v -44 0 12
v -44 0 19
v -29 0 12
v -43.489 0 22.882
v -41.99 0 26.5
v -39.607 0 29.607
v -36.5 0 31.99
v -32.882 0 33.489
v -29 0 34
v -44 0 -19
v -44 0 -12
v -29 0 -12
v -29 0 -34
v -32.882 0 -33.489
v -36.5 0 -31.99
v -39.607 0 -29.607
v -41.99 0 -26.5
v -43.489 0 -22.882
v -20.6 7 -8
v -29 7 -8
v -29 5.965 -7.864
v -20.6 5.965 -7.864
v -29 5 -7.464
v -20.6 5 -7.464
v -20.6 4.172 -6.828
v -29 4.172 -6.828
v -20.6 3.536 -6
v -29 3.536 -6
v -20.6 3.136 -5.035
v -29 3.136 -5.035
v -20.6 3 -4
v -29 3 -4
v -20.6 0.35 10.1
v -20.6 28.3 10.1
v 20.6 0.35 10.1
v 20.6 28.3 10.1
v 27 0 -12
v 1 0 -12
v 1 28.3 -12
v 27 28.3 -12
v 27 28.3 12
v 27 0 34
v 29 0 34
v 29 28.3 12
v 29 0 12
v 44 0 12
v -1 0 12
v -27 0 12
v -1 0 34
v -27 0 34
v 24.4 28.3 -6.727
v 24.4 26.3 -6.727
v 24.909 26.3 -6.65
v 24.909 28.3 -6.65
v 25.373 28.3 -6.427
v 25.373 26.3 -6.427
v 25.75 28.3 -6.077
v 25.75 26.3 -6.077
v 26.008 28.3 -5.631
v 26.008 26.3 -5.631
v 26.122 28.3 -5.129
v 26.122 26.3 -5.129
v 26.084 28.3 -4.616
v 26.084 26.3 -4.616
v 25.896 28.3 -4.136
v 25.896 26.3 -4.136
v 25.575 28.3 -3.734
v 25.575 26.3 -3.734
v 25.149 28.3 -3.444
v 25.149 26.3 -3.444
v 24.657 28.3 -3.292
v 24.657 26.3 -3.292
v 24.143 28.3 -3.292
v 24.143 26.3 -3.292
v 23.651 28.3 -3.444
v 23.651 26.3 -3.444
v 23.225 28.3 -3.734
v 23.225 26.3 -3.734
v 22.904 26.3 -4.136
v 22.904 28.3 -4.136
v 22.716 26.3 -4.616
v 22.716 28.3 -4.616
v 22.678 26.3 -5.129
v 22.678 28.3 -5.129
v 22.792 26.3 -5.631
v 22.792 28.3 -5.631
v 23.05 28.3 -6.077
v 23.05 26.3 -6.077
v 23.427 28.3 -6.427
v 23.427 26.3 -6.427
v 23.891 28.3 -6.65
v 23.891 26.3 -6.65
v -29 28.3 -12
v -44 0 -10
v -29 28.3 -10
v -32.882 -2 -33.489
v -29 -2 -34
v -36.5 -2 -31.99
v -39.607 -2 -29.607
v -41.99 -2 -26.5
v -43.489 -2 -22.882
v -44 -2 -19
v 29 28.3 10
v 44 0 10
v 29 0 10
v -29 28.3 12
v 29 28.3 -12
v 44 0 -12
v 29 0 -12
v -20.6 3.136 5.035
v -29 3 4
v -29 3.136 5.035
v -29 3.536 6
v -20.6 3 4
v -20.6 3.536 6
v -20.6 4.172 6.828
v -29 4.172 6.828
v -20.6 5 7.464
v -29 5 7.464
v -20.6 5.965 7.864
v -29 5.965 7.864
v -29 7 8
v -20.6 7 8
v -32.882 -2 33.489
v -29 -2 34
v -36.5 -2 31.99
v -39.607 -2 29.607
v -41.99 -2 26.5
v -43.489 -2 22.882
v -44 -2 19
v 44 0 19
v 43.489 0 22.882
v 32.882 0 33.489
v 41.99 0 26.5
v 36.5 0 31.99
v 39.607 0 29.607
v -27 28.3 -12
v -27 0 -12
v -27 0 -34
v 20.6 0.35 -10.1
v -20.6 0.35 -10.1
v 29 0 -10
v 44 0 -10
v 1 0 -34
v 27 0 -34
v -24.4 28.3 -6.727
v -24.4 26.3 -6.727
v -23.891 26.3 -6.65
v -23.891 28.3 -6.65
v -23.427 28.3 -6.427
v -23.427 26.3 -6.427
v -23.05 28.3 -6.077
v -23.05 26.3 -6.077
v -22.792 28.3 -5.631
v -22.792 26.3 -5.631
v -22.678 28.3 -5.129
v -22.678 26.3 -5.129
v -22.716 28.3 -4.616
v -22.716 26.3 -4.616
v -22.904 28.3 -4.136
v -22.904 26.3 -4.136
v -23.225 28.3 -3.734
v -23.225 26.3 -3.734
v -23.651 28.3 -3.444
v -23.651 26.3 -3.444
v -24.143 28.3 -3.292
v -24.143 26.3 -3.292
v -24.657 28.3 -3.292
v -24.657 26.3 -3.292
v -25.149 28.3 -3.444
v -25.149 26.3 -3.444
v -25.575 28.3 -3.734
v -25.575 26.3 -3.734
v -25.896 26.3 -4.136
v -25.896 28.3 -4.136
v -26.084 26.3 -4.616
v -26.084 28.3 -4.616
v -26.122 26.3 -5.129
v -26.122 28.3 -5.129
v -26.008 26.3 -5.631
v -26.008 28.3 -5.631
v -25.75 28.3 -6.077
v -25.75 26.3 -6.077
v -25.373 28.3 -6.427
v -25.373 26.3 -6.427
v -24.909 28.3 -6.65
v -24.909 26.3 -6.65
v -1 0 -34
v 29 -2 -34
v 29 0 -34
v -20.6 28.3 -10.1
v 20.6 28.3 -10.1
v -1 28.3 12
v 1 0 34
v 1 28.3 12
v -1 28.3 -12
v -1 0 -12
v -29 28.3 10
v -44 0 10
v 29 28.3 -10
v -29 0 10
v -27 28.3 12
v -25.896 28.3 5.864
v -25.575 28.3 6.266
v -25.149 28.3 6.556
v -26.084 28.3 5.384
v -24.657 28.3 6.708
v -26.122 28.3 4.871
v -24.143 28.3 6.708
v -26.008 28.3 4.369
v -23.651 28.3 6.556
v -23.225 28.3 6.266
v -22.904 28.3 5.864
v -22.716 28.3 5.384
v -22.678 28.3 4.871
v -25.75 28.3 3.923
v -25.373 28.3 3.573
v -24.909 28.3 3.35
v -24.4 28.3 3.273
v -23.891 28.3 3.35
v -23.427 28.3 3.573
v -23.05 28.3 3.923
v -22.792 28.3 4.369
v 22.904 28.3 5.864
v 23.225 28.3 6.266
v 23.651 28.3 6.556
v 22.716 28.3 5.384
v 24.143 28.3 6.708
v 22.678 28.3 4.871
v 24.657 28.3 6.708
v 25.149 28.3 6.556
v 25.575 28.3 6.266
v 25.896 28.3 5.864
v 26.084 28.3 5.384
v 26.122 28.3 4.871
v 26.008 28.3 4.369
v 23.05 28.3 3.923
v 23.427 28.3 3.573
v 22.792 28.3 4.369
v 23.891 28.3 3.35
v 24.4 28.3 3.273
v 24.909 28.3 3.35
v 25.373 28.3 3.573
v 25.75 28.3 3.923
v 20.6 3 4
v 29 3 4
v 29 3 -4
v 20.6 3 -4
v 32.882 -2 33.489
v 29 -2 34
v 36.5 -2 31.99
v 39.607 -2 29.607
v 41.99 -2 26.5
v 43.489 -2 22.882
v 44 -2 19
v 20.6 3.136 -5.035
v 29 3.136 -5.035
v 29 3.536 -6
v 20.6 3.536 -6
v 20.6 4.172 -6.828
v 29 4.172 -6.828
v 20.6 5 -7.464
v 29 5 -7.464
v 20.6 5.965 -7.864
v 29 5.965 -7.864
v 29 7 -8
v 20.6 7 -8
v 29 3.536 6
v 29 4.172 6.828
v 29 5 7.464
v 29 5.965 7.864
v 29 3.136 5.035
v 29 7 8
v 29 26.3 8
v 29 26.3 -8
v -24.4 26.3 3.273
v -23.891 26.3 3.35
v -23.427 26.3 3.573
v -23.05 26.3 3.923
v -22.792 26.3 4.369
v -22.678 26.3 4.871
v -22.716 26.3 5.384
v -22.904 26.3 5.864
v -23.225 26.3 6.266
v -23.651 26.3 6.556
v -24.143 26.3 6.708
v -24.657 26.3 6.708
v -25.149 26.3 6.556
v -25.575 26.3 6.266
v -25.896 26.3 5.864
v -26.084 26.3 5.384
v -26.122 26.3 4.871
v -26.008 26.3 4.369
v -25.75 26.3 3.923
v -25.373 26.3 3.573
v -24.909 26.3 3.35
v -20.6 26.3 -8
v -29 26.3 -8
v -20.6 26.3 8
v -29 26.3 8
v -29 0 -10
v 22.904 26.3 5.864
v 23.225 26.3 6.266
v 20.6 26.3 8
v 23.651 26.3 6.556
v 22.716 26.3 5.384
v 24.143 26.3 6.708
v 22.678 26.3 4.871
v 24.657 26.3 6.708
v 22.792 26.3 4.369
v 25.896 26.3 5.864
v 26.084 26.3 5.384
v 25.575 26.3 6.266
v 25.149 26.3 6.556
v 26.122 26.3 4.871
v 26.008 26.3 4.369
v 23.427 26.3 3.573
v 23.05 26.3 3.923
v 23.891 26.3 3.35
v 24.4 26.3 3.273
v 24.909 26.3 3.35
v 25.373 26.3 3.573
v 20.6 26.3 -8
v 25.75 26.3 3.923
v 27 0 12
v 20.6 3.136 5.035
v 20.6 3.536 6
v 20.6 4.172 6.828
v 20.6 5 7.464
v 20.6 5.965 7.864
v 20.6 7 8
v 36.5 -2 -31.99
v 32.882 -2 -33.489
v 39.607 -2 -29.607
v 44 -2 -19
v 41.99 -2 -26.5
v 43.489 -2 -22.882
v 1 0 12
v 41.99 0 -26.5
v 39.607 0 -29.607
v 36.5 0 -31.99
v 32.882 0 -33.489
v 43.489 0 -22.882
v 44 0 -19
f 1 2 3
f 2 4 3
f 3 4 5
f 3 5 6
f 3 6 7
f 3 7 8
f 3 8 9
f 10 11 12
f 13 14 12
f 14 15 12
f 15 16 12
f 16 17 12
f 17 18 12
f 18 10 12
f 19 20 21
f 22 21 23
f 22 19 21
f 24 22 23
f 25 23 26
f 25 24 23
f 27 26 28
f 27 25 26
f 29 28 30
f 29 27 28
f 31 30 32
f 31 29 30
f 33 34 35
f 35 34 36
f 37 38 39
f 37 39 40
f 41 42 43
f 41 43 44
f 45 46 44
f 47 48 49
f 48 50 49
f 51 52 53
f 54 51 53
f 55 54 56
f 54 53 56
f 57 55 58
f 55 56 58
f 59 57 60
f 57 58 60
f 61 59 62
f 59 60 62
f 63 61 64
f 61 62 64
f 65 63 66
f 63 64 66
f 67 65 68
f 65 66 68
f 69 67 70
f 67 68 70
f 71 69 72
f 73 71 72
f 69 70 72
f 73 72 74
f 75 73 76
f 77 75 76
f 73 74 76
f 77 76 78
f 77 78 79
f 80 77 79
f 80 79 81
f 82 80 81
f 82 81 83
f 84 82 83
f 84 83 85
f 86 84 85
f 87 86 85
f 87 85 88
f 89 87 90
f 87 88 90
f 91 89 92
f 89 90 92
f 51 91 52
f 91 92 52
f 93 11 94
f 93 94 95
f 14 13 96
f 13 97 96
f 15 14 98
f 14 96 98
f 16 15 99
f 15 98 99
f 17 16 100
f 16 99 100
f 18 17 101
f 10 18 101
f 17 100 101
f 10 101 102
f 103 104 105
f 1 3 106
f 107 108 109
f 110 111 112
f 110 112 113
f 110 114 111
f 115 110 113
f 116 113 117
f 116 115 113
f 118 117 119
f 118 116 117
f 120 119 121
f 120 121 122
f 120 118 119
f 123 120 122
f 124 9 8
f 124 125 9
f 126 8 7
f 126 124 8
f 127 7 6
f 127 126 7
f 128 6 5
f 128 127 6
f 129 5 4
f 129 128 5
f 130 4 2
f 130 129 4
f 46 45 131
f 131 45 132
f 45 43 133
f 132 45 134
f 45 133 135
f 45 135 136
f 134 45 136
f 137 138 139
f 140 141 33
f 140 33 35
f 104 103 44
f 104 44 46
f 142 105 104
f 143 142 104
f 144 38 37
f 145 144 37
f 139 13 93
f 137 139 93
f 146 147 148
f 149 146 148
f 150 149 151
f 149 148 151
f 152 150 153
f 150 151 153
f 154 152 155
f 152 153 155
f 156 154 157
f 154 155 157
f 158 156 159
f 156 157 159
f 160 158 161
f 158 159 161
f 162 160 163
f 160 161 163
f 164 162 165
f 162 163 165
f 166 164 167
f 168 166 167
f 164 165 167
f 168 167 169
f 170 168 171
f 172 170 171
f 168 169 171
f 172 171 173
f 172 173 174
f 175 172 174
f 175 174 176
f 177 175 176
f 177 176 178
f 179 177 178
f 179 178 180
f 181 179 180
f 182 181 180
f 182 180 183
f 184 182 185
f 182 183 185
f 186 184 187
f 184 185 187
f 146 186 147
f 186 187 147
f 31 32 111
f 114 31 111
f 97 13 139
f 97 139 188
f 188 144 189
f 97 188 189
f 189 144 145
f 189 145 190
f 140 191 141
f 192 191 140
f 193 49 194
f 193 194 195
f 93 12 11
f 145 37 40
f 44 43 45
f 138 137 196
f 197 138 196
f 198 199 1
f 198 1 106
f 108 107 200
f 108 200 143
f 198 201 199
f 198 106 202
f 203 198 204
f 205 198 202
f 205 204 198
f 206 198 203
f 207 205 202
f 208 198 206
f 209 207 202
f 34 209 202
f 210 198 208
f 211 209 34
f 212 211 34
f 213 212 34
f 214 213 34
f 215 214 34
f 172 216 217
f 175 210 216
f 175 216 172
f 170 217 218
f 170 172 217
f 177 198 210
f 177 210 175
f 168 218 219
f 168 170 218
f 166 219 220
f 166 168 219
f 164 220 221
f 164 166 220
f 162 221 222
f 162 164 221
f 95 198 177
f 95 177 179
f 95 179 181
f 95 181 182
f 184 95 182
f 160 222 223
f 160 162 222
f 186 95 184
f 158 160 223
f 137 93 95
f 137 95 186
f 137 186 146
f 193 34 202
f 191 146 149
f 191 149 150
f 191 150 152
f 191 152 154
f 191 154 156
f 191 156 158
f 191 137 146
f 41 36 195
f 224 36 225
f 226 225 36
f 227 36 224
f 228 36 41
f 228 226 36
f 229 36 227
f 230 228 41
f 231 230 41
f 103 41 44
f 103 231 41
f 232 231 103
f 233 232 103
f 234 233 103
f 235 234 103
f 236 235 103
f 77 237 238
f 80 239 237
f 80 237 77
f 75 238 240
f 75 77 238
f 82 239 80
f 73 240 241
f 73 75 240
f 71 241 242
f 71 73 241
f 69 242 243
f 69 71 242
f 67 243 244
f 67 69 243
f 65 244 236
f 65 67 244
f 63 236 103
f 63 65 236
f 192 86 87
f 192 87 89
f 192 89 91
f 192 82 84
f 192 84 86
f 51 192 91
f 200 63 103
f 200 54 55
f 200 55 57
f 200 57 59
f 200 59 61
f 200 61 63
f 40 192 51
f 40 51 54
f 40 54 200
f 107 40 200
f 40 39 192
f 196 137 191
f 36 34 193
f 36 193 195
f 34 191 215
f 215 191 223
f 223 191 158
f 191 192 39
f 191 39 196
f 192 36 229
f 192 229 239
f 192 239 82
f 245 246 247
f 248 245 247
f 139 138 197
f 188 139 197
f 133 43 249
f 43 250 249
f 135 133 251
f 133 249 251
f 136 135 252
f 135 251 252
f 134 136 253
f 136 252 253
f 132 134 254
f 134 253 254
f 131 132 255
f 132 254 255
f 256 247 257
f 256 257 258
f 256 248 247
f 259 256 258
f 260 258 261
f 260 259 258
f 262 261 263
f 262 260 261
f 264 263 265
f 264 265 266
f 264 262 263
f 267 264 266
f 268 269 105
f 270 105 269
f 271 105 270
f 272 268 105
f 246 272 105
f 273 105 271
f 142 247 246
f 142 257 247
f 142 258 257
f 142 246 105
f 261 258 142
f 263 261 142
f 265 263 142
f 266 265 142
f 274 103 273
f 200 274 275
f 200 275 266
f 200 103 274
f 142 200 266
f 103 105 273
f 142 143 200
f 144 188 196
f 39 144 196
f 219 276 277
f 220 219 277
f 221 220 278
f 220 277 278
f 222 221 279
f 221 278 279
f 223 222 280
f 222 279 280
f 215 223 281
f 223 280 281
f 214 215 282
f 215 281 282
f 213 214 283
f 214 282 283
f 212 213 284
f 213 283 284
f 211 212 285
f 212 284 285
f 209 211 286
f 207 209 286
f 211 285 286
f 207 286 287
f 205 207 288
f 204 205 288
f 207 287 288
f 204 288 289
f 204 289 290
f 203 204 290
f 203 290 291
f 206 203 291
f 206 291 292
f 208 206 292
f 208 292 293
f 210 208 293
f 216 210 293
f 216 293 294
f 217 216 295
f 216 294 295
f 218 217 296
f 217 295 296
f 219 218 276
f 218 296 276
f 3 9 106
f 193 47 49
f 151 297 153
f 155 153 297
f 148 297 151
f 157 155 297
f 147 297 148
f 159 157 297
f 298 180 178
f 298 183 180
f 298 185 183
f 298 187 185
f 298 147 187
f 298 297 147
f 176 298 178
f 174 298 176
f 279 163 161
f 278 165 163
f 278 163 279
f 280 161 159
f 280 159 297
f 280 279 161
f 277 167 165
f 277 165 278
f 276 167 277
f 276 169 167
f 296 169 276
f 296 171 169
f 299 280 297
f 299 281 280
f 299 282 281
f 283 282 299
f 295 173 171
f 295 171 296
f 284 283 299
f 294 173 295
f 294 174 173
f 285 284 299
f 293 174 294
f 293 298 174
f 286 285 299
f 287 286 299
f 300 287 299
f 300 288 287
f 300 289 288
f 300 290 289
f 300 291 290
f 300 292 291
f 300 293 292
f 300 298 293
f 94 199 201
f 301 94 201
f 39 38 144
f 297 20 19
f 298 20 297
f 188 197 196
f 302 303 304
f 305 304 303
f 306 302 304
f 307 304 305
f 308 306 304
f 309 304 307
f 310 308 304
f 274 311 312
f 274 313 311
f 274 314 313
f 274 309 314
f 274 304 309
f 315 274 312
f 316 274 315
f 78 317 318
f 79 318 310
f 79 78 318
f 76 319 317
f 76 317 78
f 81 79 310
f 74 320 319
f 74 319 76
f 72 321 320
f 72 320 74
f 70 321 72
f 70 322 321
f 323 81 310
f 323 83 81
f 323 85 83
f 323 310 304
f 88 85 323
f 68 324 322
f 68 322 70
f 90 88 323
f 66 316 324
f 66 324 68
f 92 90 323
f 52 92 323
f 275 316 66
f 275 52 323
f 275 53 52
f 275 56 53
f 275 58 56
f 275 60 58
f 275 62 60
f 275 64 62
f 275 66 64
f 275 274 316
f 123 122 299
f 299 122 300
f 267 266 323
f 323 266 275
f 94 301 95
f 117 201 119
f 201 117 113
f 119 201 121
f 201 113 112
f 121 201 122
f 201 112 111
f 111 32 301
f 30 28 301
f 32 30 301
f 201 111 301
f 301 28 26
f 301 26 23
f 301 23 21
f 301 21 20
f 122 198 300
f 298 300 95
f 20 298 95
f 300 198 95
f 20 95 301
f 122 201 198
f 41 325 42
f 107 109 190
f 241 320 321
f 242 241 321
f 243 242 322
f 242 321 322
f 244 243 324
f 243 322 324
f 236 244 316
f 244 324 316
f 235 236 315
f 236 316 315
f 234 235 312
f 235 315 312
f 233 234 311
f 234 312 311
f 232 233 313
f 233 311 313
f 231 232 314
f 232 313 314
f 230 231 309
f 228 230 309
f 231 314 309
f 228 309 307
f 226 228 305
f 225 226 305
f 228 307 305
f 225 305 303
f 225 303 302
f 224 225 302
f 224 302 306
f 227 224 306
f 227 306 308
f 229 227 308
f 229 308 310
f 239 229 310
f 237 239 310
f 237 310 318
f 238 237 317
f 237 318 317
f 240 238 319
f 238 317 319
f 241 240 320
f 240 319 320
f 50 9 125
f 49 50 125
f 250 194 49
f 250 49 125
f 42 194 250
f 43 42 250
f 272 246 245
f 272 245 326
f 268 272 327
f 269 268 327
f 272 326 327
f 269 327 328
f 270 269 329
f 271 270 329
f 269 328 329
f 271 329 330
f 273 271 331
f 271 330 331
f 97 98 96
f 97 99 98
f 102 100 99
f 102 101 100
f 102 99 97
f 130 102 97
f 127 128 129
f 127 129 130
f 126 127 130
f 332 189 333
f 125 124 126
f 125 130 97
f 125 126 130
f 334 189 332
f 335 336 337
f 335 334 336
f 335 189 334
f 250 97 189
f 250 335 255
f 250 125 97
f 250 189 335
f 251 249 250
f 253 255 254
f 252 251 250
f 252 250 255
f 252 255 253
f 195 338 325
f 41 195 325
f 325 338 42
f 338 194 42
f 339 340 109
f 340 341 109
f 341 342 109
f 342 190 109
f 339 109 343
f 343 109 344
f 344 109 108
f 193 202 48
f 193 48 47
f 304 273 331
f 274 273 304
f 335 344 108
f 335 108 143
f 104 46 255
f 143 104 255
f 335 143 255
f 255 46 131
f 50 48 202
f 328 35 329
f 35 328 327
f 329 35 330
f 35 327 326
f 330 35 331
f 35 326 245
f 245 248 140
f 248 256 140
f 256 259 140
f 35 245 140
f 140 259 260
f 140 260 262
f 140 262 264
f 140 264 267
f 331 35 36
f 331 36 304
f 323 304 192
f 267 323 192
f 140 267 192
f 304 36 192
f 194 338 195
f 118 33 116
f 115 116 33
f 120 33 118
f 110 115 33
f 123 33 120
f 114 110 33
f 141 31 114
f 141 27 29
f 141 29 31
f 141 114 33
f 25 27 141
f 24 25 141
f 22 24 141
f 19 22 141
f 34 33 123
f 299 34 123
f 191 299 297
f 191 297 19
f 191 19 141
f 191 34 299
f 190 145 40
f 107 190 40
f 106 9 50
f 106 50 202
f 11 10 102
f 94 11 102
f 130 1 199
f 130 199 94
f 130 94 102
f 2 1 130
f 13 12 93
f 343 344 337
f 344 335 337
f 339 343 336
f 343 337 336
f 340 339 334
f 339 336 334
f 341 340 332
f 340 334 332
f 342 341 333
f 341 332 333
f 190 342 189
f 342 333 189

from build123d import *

# Parameters (mm, degrees)
SKETCH1_W                 = 58
SKETCH1_H                 = 24
BOSS_EXTRUDE1_DEPTH       = 28.3
SKETCH2_W                 = 88
SKETCH2_H                 = 68
BOSS_EXTRUDE2_DEPTH       = 2
SKETCH12_W                = 41.2
SKETCH12_H                = 20.2
CUT_EXTRUDE1_DEPTH        = 27.95
BOSS_EXTRUDE6_DEPTH       = 2
LPATTERN2_COUNT           = 3
LPATTERN2_PITCH           = 28
BOSS_EXTRUDE7_DEPTH       = 2
LPATTERN3_COUNT           = 2
LPATTERN3_PITCH           = 22
SKETCH17_R                = 1
CUT_EXTRUDE2_DEPTH        = 10
F_8_32_TAPPED_HOLE1_D     = 3.4544
F_8_32_TAPPED_HOLE1_DEPTH = 12
F_8_32_TAPPED_HOLE1_TIP   = 1.037806461
FILLET1_R                 = 15
FILLET2_R                 = 15
FILLET3_R                 = 15
FILLET5_R                 = 15
SKETCH20_W                = 16
SKETCH20_H                = 23.3
CUT_EXTRUDE3_DEPTH        = 10
SKETCH21_W                = 16
SKETCH21_H                = 23.3
CUT_EXTRUDE4_DEPTH        = 10
FILLET6_R                 = 4
FILLET7_R                 = 4
FILLET8_R                 = 4
FILLET9_R                 = 4


with BuildPart() as part:
    # Sketch1 → Boss-Extrude1 (new body)
    with BuildSketch(Plane(origin=(0, 0, 0), x_dir=(1, 0, 0), z_dir=(0, 1, 0))):
        Rectangle(SKETCH1_W, SKETCH1_H)
    extrude(amount=BOSS_EXTRUDE1_DEPTH)

    # Sketch2 → Boss-Extrude2 (add)
    with BuildSketch(Plane.XZ):
        Rectangle(SKETCH2_W, SKETCH2_H)
    extrude(amount=BOSS_EXTRUDE2_DEPTH)

    # Sketch12 → Cut-Extrude1 (cut)
    with BuildSketch(Plane(origin=(0, 28.3, 0), x_dir=(1, 0, 0), z_dir=(0, 1, 0))):
        Rectangle(SKETCH12_W, SKETCH12_H)
    extrude(amount=-CUT_EXTRUDE1_DEPTH, mode=Mode.SUBTRACT)

    # Sketch14 → Boss-Extrude6 (add)
    with BuildSketch(Plane.ZY.offset(29)):
        Polygon((-12, 28.3), (-12, 0), (-34, 0), align=None)
        Polygon((12, 28.3), (12, 0), (34, 0), align=None)
    boss_extrude6 = extrude(amount=-BOSS_EXTRUDE6_DEPTH)

    # LPattern2: Boss-Extrude6 ×3
    with Locations(*[(i * LPATTERN2_PITCH, 0, 0) for i in range(1, LPATTERN2_COUNT)]):
        add(boss_extrude6)

    # Sketch16 → Boss-Extrude7 (add)
    with BuildSketch(Plane(origin=(0, 0, -12), x_dir=(-1, 0, 0), z_dir=(0, 0, -1))):
        Polygon((-29, 28.3), (-44, 0), (-29, 0), align=None)
        Polygon((29, 28.3), (29, 0), (44, 0), align=None)
    boss_extrude7 = extrude(amount=-BOSS_EXTRUDE7_DEPTH)

    # LPattern3: Boss-Extrude7 ×2
    with Locations(*[(0, 0, i * LPATTERN3_PITCH) for i in range(1, LPATTERN3_COUNT)]):
        add(boss_extrude7)

    # Sketch17 → Cut-Extrude2 (cut)
    with BuildSketch(Plane(origin=(0, 28.3, 0), x_dir=(1, 0, 0), z_dir=(0, 1, 0))):
        with Locations(Location((-24.4, 5, 0), (0, 0, 270))):
            Circle(SKETCH17_R)
        with Locations(Location((-24.4, -5, 0), (0, 0, 270))):
            Circle(SKETCH17_R)
        with Locations(Location((24.4, -5, 0), (0, 0, 270))):
            Circle(SKETCH17_R)
        with Locations(Location((24.4, 5, 0), (0, 0, 270))):
            Circle(SKETCH17_R)
    extrude(amount=-CUT_EXTRUDE2_DEPTH, mode=Mode.SUBTRACT)

    # #8-32 Tapped Hole1
    with Locations(Plane(origin=(-24.4, 28.3, -5), x_dir=(0, 0, 1), z_dir=(0, 1, 0))):
        with Locations((0, 0), (10, 0), (0, 48.8), (10, 48.8)):
            Hole(F_8_32_TAPPED_HOLE1_D / 2, depth=F_8_32_TAPPED_HOLE1_DEPTH)
            with Locations((0, 0, -(F_8_32_TAPPED_HOLE1_DEPTH + F_8_32_TAPPED_HOLE1_TIP / 2))):  # 118° drill point
                Cone(0, F_8_32_TAPPED_HOLE1_D / 2, F_8_32_TAPPED_HOLE1_TIP, mode=Mode.SUBTRACT)

    # Fillet1
    fillet1_edges = [part.edges().sort_by_distance(p)[0] for p in [
        (-44, -1, 34),
    ]]
    fillet(fillet1_edges, radius=FILLET1_R)

    # Fillet2
    fillet2_edges = [part.edges().sort_by_distance(p)[0] for p in [
        (44, -1, 34),
    ]]
    fillet(fillet2_edges, radius=FILLET2_R)

    # Fillet3
    fillet3_edges = [part.edges().sort_by_distance(p)[0] for p in [
        (44, -1, -34),
    ]]
    fillet(fillet3_edges, radius=FILLET3_R)

    # Fillet5
    fillet5_edges = [part.edges().sort_by_distance(p)[0] for p in [
        (-44, -1, -34),
    ]]
    fillet(fillet5_edges, radius=FILLET5_R)

    # Sketch20 → Cut-Extrude3 (cut)
    with BuildSketch(Plane.ZY.offset(29)):
        with Locations((0, 14.65)):
            Rectangle(SKETCH20_W, SKETCH20_H)
    extrude(amount=-CUT_EXTRUDE3_DEPTH, mode=Mode.SUBTRACT)

    # Sketch21 → Cut-Extrude4 (cut)
    with BuildSketch(Plane(origin=(29, 0, 0), x_dir=(0, 0, -1), z_dir=(1, 0, 0))):
        with Locations((0, 14.65)):
            Rectangle(SKETCH21_W, SKETCH21_H)
    extrude(amount=-CUT_EXTRUDE4_DEPTH, mode=Mode.SUBTRACT)

    # Fillet6
    fillet6_edges = [part.edges().sort_by_distance(p)[0] for p in [
        (24.8, 3, 8),
    ]]
    fillet(fillet6_edges, radius=FILLET6_R)

    # Fillet7
    fillet7_edges = [part.edges().sort_by_distance(p)[0] for p in [
        (24.8, 3, -8),
    ]]
    fillet(fillet7_edges, radius=FILLET7_R)

    # Fillet8
    fillet8_edges = [part.edges().sort_by_distance(p)[0] for p in [
        (-24.8, 3, -8),
    ]]
    fillet(fillet8_edges, radius=FILLET8_R)

    # Fillet9
    fillet9_edges = [part.edges().sort_by_distance(p)[0] for p in [
        (-24.8, 3, 8),
    ]]
    fillet(fillet9_edges, radius=FILLET9_R)


solid = part.part
